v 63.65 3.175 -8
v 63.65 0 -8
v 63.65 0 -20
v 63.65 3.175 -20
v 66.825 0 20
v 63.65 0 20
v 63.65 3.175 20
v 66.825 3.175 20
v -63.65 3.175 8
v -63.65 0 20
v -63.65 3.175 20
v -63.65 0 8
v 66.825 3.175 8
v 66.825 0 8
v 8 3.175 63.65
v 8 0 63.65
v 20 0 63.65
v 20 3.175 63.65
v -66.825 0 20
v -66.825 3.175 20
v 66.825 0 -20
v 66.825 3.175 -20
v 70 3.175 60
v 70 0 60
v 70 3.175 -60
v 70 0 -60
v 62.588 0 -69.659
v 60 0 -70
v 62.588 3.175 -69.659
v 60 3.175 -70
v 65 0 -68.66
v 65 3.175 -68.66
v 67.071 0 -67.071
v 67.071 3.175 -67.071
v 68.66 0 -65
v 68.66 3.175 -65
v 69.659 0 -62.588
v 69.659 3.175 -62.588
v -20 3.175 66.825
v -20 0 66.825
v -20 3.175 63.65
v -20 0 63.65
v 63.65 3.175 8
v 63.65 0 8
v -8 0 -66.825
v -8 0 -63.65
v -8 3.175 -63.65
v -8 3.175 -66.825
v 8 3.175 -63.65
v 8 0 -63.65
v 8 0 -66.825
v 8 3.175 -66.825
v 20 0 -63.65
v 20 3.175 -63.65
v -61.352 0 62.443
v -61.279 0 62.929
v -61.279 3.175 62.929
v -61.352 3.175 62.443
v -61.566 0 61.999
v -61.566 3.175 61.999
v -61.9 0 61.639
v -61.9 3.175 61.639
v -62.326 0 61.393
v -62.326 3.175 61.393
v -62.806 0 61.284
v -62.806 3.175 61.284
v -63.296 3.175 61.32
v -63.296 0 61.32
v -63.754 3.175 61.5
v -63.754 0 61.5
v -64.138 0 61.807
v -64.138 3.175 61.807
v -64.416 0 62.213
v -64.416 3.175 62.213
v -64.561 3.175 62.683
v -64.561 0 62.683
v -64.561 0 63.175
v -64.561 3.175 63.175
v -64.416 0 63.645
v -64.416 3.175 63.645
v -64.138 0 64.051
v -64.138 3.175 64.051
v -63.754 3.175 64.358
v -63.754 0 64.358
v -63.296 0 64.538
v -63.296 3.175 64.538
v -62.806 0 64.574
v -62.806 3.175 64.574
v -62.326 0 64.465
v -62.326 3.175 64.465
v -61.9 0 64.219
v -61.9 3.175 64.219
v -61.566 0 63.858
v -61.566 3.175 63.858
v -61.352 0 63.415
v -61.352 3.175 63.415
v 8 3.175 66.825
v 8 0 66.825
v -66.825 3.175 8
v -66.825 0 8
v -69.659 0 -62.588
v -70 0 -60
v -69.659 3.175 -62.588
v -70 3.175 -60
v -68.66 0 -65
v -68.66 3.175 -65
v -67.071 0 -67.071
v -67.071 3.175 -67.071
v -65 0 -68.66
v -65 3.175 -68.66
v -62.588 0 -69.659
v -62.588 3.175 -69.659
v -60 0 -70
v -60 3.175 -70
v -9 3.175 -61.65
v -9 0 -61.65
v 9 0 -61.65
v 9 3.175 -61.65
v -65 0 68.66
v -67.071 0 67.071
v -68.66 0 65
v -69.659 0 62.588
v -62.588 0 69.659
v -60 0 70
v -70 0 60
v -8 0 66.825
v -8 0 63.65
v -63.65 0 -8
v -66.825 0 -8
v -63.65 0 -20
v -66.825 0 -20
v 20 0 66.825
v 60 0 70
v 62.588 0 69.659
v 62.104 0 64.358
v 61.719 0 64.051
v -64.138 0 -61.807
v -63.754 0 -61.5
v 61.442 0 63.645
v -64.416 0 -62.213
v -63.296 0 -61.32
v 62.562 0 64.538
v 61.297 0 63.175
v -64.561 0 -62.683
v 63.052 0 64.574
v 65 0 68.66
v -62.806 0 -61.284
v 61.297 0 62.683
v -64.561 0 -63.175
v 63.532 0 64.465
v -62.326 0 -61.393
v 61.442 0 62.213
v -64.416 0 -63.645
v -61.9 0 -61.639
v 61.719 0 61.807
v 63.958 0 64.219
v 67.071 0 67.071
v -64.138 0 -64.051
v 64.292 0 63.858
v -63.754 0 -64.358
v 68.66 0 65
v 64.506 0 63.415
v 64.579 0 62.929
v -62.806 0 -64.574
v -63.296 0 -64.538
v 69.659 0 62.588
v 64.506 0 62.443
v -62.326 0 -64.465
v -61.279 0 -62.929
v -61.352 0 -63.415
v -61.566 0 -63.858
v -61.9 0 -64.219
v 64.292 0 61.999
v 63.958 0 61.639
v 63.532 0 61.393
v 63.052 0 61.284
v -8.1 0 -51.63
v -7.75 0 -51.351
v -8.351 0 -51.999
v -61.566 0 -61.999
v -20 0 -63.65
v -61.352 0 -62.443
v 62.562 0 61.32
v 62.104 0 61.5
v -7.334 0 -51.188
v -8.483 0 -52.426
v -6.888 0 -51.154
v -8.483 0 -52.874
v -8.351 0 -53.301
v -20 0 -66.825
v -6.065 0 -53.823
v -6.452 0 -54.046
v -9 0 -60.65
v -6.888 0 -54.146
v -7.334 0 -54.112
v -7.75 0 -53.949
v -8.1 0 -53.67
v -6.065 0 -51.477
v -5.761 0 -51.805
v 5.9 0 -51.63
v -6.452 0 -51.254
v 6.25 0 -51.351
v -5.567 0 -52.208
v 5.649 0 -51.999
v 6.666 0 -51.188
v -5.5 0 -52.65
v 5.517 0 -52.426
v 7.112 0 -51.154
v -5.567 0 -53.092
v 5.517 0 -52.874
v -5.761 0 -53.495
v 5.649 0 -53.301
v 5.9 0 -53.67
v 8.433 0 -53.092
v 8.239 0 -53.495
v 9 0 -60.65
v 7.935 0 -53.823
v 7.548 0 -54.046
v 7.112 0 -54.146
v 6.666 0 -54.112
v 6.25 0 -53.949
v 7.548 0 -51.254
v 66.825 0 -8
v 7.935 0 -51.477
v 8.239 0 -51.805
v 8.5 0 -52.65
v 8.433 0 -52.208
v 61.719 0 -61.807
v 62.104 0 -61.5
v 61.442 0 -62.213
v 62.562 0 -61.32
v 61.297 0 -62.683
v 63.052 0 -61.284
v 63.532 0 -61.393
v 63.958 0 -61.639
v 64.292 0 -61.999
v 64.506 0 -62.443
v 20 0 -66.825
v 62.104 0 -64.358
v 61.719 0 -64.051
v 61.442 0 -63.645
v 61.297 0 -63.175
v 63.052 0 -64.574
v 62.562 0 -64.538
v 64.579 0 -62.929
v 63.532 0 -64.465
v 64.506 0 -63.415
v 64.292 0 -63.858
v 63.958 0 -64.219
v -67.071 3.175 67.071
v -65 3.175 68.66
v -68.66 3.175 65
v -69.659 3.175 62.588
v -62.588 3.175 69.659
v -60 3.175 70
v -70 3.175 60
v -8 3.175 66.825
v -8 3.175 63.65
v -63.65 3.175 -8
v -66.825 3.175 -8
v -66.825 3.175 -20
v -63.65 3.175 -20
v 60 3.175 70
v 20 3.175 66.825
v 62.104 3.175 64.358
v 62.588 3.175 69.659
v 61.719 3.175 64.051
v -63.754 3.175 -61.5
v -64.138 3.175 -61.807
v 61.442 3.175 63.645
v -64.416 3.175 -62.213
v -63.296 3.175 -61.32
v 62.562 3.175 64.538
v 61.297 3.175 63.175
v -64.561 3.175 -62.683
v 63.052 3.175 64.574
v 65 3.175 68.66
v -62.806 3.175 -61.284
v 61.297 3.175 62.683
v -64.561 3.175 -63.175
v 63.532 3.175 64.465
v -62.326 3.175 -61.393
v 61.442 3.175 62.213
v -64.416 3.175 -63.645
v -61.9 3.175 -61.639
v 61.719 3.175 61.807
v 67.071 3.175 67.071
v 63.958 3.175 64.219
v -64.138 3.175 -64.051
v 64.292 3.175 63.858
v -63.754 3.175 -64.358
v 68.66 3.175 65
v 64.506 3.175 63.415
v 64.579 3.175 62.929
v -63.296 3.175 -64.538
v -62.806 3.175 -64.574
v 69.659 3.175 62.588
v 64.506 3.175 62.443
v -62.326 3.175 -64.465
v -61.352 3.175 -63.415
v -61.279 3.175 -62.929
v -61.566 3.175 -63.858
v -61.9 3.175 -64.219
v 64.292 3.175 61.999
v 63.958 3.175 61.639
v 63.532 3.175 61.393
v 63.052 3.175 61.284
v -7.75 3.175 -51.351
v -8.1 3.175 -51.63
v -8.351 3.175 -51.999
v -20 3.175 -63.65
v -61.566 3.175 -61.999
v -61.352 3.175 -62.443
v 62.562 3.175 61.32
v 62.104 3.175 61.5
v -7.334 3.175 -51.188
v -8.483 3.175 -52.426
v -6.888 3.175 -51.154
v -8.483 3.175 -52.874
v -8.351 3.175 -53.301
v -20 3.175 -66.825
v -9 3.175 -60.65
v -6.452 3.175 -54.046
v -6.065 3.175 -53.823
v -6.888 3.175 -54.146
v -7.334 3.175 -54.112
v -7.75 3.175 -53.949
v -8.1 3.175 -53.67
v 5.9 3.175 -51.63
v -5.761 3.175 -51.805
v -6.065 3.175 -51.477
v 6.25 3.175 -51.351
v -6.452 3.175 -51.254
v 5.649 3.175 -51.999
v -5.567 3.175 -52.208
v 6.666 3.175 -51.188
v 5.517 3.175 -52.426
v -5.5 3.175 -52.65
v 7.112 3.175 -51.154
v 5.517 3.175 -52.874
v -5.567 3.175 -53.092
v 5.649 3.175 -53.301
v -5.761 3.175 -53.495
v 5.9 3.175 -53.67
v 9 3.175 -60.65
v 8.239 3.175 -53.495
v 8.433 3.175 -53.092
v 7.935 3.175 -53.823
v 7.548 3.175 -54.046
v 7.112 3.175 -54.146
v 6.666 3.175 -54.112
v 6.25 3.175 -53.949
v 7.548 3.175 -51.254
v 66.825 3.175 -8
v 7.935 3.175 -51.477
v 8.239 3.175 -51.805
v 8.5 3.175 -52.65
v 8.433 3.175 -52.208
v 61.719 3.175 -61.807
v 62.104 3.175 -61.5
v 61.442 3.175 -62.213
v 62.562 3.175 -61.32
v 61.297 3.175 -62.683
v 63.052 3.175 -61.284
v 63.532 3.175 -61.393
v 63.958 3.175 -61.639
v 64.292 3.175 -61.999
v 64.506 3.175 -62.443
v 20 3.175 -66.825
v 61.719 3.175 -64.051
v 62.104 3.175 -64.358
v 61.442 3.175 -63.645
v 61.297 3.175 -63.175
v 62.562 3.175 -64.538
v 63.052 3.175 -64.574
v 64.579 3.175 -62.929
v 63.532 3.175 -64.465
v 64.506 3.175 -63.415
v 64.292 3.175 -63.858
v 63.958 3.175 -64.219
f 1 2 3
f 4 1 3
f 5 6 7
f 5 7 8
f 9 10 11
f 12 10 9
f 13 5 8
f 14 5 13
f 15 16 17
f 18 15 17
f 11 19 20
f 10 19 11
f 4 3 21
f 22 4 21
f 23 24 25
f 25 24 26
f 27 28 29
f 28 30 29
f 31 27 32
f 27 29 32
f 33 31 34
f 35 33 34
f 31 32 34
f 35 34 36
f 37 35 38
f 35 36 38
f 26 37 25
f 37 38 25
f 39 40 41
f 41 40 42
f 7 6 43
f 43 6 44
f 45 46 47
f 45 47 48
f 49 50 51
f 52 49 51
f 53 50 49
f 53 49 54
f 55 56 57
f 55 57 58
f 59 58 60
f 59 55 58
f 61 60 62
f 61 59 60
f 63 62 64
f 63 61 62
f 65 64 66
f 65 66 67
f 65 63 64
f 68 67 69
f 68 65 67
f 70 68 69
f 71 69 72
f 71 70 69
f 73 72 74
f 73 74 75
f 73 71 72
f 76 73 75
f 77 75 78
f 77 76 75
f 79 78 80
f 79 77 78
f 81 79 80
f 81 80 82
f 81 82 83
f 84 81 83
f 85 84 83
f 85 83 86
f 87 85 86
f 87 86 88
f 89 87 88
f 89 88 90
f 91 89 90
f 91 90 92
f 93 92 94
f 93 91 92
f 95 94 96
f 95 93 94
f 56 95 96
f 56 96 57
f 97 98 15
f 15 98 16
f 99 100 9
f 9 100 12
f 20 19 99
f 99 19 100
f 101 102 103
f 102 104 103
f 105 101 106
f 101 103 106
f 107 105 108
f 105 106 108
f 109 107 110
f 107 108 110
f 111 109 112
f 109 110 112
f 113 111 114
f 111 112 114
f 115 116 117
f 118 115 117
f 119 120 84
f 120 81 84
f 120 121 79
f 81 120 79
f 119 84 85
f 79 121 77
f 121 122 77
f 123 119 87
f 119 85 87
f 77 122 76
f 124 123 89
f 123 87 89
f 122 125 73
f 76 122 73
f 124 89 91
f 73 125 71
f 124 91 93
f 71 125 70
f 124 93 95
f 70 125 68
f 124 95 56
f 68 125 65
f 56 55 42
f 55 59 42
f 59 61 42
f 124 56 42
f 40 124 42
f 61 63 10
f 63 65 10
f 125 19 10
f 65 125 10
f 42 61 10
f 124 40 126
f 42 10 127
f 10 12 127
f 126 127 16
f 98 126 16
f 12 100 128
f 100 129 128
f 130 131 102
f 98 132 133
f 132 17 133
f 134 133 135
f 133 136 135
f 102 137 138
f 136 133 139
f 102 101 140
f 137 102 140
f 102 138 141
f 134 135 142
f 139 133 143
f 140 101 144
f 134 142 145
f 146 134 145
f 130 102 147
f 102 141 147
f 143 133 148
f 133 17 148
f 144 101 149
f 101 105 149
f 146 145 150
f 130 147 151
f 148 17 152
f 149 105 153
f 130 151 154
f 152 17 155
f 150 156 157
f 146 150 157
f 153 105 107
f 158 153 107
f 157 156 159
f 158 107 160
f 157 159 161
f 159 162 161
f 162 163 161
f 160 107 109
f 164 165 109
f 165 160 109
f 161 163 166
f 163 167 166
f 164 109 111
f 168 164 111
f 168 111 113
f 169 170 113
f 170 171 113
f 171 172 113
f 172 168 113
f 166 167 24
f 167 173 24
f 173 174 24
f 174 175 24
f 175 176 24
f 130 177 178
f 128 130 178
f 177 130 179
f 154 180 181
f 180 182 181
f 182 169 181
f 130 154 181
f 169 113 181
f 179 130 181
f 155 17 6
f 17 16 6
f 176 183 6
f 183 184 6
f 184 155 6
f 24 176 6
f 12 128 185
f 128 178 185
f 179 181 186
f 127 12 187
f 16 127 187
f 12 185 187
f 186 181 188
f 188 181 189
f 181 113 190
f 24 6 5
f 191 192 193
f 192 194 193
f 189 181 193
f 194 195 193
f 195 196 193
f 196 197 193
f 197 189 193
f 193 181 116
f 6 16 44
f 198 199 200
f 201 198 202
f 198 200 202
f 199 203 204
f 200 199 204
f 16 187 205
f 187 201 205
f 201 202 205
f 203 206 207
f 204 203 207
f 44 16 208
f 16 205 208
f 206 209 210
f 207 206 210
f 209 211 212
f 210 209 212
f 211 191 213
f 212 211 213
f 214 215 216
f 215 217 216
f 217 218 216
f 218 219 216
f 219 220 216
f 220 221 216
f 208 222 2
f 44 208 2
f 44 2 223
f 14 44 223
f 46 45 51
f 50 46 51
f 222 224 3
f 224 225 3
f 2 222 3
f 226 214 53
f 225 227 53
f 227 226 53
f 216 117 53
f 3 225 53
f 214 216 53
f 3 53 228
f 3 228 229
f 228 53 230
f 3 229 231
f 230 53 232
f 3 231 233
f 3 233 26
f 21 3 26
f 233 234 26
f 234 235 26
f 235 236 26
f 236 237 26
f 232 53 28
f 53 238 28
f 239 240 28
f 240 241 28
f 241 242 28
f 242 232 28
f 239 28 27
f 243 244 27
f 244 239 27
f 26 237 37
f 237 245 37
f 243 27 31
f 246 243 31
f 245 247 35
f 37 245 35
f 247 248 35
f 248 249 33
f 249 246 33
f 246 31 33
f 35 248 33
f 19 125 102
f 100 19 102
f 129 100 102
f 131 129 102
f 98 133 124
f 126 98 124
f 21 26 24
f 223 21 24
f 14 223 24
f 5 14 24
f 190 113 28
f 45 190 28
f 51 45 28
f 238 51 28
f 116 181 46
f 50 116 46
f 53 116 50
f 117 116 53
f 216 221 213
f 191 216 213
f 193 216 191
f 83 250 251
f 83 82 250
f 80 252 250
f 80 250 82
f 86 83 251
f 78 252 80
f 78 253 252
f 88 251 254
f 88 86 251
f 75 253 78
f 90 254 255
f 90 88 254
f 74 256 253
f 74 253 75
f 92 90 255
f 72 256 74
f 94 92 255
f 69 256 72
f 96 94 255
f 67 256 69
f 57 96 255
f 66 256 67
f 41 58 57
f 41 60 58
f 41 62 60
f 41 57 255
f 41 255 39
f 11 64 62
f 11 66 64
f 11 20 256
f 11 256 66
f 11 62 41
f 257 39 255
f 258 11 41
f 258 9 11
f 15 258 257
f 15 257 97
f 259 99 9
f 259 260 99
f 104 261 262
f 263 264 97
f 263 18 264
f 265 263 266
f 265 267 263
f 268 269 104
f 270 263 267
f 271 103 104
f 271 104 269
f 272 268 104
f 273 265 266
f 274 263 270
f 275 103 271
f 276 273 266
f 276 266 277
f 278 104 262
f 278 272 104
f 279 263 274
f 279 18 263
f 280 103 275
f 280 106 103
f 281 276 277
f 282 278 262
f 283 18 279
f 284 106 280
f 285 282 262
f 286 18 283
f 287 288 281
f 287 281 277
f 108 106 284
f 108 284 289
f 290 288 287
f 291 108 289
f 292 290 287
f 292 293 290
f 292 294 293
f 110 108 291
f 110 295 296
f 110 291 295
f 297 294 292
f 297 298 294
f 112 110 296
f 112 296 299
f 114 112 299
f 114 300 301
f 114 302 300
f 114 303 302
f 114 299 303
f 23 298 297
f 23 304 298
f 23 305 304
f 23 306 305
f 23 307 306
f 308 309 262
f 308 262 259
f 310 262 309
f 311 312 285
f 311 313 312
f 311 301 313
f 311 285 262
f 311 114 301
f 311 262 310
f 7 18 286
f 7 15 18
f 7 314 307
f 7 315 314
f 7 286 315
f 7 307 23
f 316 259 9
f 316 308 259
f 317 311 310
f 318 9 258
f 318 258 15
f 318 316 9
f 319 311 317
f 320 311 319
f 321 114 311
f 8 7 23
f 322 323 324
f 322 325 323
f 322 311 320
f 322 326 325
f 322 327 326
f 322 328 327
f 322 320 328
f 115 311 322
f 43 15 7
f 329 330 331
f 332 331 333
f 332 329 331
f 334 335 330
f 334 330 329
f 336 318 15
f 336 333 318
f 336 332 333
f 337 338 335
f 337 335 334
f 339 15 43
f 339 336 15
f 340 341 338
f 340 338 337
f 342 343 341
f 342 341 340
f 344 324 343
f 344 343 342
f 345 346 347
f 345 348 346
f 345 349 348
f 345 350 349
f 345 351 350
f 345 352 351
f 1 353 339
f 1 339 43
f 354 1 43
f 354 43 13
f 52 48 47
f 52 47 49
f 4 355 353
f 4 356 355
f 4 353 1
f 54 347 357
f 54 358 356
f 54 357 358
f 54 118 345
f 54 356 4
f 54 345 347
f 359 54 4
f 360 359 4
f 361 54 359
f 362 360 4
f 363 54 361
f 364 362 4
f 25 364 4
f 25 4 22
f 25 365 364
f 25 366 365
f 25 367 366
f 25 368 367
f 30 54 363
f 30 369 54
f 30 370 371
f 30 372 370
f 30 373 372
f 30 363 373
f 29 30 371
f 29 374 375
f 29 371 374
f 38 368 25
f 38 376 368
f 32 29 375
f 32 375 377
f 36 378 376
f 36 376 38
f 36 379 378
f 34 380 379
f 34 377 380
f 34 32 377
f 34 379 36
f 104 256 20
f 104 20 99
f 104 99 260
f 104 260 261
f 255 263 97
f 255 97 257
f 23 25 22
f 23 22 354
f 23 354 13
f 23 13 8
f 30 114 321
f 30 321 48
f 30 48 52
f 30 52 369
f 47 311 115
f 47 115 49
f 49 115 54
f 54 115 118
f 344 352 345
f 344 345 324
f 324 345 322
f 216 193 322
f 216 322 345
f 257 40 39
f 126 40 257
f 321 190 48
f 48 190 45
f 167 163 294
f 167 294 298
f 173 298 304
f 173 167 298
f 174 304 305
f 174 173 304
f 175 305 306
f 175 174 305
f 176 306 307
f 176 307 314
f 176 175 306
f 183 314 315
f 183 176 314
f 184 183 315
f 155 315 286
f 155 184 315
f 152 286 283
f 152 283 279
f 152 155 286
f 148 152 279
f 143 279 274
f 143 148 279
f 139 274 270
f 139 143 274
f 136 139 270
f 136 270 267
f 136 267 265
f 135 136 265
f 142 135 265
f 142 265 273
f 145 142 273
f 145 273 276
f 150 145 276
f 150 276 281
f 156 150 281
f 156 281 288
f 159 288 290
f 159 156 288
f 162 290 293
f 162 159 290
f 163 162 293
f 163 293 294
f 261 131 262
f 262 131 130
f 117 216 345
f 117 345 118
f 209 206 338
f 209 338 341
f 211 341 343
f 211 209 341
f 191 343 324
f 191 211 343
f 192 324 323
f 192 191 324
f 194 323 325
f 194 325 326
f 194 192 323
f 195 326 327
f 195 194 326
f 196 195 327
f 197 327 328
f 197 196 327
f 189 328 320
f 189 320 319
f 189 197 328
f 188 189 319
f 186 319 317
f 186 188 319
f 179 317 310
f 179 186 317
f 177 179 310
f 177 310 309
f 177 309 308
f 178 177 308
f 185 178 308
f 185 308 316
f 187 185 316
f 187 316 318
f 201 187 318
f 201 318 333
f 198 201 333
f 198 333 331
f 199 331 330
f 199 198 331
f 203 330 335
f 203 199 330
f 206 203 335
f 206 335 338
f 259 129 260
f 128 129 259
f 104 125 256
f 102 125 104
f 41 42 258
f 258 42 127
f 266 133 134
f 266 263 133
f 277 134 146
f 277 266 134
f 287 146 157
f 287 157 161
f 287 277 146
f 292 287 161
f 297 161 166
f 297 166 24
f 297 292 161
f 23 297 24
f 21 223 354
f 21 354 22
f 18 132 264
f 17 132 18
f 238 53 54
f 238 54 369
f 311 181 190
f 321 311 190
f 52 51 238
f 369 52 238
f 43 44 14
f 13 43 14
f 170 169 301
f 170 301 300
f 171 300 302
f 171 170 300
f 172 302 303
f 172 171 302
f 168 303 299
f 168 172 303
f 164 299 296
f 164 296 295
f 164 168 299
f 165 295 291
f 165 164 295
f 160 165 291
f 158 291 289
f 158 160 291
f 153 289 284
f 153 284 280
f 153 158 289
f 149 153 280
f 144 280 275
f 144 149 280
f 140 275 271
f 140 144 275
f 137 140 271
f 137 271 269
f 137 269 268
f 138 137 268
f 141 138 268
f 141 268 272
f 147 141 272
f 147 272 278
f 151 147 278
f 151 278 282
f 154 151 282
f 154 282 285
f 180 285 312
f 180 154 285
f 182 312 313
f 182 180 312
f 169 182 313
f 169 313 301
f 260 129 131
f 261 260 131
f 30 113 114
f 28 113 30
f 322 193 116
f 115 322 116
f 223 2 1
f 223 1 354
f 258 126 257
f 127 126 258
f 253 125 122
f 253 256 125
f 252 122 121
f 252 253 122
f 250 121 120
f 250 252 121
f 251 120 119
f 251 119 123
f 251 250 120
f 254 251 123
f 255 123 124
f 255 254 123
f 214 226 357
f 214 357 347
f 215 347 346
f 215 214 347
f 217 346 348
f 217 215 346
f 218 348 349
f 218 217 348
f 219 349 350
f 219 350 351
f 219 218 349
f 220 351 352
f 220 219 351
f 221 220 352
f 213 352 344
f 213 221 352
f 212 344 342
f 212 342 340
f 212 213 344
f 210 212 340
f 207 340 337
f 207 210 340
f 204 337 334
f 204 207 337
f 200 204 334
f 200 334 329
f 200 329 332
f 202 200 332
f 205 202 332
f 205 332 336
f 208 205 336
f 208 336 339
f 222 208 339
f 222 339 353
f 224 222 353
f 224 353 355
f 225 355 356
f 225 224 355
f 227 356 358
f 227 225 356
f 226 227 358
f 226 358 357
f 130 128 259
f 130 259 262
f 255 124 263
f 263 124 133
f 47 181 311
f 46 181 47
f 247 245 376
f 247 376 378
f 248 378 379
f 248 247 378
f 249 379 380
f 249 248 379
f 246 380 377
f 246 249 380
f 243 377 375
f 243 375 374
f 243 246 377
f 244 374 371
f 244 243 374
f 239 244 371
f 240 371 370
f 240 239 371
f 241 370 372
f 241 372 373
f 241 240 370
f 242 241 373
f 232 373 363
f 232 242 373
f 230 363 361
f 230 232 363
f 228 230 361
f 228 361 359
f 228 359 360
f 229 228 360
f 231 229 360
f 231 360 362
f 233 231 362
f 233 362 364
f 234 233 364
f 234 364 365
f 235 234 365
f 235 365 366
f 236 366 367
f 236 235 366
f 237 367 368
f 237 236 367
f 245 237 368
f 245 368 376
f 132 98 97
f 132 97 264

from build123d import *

# Parameters (mm, degrees)
SKETCH1_W           = 140
SKETCH1_H           = 140
SKETCH1_R           = 1.65
SKETCH1_R_2         = 1.5
SKETCH1_W_2         = 3.175
SKETCH1_H_2         = 12
SKETCH1_W_3         = 12
SKETCH1_H_3         = 3.175
SKETCH1_W_4         = 18
SKETCH1_H_4         = 1
BOSS_EXTRUDE1_DEPTH = 3.175
FILLET1_R           = 10


with BuildPart() as part:
    # Sketch1 → Boss-Extrude1 (new body)
    with BuildSketch(Plane(origin=(0, 0, 0), x_dir=(1, 0, 0), z_dir=(0, 1, 0))):
        Rectangle(SKETCH1_W, SKETCH1_H)
        with Locations((62.928932188, -62.928932188)):
            Circle(SKETCH1_R, mode=Mode.SUBTRACT)
        with Locations((62.928932188, 62.928932188)):
            Circle(SKETCH1_R, mode=Mode.SUBTRACT)
        with Locations((-62.928932188, -62.928932188)):
            Circle(SKETCH1_R, mode=Mode.SUBTRACT)
        with Locations((-62.928932188, 62.928932188)):
            Circle(SKETCH1_R, mode=Mode.SUBTRACT)
        with Locations((7, 52.65)):
            Circle(SKETCH1_R_2, mode=Mode.SUBTRACT)
        with Locations((-7, 52.65)):
            Circle(SKETCH1_R_2, mode=Mode.SUBTRACT)
        with Locations((-65.2375, -14)):
            Rectangle(SKETCH1_W_2, SKETCH1_H_2, mode=Mode.SUBTRACT)
        with Locations((65.2375, -14)):
            Rectangle(SKETCH1_W_2, SKETCH1_H_2, mode=Mode.SUBTRACT)
        with Locations((14, -65.2375)):
            Rectangle(SKETCH1_W_3, SKETCH1_H_3, mode=Mode.SUBTRACT)
        with Locations((-14, -65.2375)):
            Rectangle(SKETCH1_W_3, SKETCH1_H_3, mode=Mode.SUBTRACT)
        with Locations((65.2375, 14)):
            Rectangle(SKETCH1_W_2, SKETCH1_H_2, mode=Mode.SUBTRACT)
        with Locations((14, 65.2375)):
            Rectangle(SKETCH1_W_3, SKETCH1_H_3, mode=Mode.SUBTRACT)
        with Locations((-14, 65.2375)):
            Rectangle(SKETCH1_W_3, SKETCH1_H_3, mode=Mode.SUBTRACT)
        with Locations((-65.2375, 14)):
            Rectangle(SKETCH1_W_2, SKETCH1_H_2, mode=Mode.SUBTRACT)
        with Locations((0, 61.15)):
            Rectangle(SKETCH1_W_4, SKETCH1_H_4, mode=Mode.SUBTRACT)
    extrude(amount=BOSS_EXTRUDE1_DEPTH)

    # Fillet1
    fillet1_edges = [part.edges().sort_by_distance(p)[0] for p in [
        (70, 1.5875, 70),
        (-70, 1.5875, 70),
        (-70, 1.5875, -70),
        (70, 1.5875, -70),
    ]]
    fillet(fillet1_edges, radius=FILLET1_R)


solid = part.part
